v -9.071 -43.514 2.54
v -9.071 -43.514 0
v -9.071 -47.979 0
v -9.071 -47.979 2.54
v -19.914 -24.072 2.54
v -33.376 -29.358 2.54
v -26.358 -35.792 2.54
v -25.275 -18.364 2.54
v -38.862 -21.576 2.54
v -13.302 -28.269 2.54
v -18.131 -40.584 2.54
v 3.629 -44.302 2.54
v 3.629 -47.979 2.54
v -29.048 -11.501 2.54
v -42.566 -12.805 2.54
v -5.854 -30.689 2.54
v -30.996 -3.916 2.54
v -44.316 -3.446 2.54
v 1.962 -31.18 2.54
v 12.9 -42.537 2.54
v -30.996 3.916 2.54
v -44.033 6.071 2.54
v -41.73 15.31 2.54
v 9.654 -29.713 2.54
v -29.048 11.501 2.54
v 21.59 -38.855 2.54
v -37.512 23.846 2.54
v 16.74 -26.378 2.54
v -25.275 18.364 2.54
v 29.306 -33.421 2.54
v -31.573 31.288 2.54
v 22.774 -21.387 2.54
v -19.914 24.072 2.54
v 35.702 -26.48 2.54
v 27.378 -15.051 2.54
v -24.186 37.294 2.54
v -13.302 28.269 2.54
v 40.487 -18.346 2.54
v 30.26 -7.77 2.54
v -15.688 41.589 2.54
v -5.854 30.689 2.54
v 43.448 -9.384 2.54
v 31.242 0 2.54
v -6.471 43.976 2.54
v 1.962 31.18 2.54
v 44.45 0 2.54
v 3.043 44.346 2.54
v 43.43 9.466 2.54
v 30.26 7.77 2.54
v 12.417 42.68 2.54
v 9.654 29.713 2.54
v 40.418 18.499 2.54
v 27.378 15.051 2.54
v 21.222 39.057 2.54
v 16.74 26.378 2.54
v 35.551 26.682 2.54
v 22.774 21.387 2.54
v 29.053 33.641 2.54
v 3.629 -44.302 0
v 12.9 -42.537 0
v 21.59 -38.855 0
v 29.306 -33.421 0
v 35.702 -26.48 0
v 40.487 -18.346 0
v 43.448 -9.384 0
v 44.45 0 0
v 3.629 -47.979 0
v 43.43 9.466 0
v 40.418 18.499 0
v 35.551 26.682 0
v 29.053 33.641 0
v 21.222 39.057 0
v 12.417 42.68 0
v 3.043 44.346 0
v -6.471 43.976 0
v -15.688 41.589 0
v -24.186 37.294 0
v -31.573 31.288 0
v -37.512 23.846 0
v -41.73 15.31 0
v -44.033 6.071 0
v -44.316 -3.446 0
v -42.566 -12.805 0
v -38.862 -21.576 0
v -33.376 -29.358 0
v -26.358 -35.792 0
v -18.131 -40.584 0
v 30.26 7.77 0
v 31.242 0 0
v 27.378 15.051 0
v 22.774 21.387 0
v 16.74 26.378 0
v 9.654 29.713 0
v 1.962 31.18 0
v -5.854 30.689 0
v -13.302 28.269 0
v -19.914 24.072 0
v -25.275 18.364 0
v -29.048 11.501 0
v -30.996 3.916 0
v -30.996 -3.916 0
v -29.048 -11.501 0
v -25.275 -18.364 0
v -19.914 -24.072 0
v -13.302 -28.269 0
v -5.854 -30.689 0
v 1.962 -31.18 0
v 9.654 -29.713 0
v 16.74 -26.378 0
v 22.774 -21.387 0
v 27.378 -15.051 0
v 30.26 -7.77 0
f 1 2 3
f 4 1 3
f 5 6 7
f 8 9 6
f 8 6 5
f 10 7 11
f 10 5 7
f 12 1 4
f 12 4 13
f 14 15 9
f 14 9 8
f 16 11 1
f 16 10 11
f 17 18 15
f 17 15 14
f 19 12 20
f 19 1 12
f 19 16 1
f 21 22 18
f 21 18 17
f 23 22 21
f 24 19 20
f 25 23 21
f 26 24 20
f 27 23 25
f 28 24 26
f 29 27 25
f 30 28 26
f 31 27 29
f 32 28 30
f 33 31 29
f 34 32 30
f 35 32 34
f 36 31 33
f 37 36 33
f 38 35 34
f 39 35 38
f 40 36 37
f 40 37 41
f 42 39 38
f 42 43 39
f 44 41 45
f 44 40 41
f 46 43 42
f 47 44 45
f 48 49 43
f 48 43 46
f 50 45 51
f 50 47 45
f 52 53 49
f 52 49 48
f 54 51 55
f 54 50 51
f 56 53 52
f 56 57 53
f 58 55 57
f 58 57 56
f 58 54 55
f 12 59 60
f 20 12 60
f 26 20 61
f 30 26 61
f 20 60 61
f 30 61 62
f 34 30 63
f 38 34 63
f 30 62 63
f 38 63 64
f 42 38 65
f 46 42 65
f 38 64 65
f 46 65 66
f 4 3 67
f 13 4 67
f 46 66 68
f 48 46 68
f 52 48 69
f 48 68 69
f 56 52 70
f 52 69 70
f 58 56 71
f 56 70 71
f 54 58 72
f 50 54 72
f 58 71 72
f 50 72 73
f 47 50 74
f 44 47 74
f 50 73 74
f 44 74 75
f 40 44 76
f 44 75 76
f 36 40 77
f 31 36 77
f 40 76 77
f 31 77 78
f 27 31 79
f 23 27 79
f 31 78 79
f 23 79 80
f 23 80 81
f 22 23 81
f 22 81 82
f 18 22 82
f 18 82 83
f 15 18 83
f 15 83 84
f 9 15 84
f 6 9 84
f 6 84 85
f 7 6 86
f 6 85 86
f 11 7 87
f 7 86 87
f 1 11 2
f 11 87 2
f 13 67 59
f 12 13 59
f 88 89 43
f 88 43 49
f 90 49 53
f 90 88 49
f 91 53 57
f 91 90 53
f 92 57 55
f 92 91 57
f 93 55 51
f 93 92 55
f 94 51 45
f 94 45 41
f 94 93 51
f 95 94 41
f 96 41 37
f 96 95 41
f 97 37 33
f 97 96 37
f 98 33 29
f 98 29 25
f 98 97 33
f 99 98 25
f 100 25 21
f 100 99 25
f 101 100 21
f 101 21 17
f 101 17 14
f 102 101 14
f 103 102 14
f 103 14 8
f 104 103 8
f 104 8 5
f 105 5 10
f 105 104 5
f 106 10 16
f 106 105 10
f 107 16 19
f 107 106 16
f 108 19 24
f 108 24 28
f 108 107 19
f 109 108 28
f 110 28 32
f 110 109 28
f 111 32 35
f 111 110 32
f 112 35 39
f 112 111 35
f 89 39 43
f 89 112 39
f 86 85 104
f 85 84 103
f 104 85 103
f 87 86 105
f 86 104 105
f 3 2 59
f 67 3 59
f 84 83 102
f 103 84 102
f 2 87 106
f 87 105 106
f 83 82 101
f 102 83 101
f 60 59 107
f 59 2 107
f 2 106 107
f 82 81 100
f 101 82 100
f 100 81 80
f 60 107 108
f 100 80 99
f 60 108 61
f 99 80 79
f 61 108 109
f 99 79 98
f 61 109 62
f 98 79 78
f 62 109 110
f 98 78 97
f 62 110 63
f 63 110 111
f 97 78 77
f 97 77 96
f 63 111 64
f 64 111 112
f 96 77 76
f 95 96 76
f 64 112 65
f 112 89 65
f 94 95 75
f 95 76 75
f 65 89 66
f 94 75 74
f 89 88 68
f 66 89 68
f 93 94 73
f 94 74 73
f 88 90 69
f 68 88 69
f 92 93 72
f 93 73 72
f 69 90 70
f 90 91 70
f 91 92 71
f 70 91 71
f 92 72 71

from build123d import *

# Parameters (mm, degrees)
F0_R     = 31.242
F1_DEPTH = 2.54


with BuildPart() as f1:
    # F0 (on Top) → F1 (new body)
    with BuildSketch(Plane.XY):
        with BuildLine():
            ThreePointArc((3.628571, -44.301647), (32.688626, -30.120695), (44.45, 0))
            ThreePointArc((44.45, 0), (-28.040841, 34.489328), (-9.071429, -43.5145))
            ThreePointArc((-9.071429, -43.5145), (-2.749741, -44.364867), (3.628571, -44.301647))
        make_face()
        Circle(F0_R, mode=Mode.SUBTRACT)
        with BuildLine():
            ThreePointArc((3.628571, -44.301647), (-2.749741, -44.364867), (-9.071429, -43.5145))
            Line((-9.071429, -43.5145), (-9.071429, -47.97935))
            Line((-9.071429, -47.97935), (3.628571, -47.97935))
            Line((3.628571, -47.97935), (3.628571, -44.301647))
        make_face()
    extrude(amount=F1_DEPTH)


solid = f1.part
